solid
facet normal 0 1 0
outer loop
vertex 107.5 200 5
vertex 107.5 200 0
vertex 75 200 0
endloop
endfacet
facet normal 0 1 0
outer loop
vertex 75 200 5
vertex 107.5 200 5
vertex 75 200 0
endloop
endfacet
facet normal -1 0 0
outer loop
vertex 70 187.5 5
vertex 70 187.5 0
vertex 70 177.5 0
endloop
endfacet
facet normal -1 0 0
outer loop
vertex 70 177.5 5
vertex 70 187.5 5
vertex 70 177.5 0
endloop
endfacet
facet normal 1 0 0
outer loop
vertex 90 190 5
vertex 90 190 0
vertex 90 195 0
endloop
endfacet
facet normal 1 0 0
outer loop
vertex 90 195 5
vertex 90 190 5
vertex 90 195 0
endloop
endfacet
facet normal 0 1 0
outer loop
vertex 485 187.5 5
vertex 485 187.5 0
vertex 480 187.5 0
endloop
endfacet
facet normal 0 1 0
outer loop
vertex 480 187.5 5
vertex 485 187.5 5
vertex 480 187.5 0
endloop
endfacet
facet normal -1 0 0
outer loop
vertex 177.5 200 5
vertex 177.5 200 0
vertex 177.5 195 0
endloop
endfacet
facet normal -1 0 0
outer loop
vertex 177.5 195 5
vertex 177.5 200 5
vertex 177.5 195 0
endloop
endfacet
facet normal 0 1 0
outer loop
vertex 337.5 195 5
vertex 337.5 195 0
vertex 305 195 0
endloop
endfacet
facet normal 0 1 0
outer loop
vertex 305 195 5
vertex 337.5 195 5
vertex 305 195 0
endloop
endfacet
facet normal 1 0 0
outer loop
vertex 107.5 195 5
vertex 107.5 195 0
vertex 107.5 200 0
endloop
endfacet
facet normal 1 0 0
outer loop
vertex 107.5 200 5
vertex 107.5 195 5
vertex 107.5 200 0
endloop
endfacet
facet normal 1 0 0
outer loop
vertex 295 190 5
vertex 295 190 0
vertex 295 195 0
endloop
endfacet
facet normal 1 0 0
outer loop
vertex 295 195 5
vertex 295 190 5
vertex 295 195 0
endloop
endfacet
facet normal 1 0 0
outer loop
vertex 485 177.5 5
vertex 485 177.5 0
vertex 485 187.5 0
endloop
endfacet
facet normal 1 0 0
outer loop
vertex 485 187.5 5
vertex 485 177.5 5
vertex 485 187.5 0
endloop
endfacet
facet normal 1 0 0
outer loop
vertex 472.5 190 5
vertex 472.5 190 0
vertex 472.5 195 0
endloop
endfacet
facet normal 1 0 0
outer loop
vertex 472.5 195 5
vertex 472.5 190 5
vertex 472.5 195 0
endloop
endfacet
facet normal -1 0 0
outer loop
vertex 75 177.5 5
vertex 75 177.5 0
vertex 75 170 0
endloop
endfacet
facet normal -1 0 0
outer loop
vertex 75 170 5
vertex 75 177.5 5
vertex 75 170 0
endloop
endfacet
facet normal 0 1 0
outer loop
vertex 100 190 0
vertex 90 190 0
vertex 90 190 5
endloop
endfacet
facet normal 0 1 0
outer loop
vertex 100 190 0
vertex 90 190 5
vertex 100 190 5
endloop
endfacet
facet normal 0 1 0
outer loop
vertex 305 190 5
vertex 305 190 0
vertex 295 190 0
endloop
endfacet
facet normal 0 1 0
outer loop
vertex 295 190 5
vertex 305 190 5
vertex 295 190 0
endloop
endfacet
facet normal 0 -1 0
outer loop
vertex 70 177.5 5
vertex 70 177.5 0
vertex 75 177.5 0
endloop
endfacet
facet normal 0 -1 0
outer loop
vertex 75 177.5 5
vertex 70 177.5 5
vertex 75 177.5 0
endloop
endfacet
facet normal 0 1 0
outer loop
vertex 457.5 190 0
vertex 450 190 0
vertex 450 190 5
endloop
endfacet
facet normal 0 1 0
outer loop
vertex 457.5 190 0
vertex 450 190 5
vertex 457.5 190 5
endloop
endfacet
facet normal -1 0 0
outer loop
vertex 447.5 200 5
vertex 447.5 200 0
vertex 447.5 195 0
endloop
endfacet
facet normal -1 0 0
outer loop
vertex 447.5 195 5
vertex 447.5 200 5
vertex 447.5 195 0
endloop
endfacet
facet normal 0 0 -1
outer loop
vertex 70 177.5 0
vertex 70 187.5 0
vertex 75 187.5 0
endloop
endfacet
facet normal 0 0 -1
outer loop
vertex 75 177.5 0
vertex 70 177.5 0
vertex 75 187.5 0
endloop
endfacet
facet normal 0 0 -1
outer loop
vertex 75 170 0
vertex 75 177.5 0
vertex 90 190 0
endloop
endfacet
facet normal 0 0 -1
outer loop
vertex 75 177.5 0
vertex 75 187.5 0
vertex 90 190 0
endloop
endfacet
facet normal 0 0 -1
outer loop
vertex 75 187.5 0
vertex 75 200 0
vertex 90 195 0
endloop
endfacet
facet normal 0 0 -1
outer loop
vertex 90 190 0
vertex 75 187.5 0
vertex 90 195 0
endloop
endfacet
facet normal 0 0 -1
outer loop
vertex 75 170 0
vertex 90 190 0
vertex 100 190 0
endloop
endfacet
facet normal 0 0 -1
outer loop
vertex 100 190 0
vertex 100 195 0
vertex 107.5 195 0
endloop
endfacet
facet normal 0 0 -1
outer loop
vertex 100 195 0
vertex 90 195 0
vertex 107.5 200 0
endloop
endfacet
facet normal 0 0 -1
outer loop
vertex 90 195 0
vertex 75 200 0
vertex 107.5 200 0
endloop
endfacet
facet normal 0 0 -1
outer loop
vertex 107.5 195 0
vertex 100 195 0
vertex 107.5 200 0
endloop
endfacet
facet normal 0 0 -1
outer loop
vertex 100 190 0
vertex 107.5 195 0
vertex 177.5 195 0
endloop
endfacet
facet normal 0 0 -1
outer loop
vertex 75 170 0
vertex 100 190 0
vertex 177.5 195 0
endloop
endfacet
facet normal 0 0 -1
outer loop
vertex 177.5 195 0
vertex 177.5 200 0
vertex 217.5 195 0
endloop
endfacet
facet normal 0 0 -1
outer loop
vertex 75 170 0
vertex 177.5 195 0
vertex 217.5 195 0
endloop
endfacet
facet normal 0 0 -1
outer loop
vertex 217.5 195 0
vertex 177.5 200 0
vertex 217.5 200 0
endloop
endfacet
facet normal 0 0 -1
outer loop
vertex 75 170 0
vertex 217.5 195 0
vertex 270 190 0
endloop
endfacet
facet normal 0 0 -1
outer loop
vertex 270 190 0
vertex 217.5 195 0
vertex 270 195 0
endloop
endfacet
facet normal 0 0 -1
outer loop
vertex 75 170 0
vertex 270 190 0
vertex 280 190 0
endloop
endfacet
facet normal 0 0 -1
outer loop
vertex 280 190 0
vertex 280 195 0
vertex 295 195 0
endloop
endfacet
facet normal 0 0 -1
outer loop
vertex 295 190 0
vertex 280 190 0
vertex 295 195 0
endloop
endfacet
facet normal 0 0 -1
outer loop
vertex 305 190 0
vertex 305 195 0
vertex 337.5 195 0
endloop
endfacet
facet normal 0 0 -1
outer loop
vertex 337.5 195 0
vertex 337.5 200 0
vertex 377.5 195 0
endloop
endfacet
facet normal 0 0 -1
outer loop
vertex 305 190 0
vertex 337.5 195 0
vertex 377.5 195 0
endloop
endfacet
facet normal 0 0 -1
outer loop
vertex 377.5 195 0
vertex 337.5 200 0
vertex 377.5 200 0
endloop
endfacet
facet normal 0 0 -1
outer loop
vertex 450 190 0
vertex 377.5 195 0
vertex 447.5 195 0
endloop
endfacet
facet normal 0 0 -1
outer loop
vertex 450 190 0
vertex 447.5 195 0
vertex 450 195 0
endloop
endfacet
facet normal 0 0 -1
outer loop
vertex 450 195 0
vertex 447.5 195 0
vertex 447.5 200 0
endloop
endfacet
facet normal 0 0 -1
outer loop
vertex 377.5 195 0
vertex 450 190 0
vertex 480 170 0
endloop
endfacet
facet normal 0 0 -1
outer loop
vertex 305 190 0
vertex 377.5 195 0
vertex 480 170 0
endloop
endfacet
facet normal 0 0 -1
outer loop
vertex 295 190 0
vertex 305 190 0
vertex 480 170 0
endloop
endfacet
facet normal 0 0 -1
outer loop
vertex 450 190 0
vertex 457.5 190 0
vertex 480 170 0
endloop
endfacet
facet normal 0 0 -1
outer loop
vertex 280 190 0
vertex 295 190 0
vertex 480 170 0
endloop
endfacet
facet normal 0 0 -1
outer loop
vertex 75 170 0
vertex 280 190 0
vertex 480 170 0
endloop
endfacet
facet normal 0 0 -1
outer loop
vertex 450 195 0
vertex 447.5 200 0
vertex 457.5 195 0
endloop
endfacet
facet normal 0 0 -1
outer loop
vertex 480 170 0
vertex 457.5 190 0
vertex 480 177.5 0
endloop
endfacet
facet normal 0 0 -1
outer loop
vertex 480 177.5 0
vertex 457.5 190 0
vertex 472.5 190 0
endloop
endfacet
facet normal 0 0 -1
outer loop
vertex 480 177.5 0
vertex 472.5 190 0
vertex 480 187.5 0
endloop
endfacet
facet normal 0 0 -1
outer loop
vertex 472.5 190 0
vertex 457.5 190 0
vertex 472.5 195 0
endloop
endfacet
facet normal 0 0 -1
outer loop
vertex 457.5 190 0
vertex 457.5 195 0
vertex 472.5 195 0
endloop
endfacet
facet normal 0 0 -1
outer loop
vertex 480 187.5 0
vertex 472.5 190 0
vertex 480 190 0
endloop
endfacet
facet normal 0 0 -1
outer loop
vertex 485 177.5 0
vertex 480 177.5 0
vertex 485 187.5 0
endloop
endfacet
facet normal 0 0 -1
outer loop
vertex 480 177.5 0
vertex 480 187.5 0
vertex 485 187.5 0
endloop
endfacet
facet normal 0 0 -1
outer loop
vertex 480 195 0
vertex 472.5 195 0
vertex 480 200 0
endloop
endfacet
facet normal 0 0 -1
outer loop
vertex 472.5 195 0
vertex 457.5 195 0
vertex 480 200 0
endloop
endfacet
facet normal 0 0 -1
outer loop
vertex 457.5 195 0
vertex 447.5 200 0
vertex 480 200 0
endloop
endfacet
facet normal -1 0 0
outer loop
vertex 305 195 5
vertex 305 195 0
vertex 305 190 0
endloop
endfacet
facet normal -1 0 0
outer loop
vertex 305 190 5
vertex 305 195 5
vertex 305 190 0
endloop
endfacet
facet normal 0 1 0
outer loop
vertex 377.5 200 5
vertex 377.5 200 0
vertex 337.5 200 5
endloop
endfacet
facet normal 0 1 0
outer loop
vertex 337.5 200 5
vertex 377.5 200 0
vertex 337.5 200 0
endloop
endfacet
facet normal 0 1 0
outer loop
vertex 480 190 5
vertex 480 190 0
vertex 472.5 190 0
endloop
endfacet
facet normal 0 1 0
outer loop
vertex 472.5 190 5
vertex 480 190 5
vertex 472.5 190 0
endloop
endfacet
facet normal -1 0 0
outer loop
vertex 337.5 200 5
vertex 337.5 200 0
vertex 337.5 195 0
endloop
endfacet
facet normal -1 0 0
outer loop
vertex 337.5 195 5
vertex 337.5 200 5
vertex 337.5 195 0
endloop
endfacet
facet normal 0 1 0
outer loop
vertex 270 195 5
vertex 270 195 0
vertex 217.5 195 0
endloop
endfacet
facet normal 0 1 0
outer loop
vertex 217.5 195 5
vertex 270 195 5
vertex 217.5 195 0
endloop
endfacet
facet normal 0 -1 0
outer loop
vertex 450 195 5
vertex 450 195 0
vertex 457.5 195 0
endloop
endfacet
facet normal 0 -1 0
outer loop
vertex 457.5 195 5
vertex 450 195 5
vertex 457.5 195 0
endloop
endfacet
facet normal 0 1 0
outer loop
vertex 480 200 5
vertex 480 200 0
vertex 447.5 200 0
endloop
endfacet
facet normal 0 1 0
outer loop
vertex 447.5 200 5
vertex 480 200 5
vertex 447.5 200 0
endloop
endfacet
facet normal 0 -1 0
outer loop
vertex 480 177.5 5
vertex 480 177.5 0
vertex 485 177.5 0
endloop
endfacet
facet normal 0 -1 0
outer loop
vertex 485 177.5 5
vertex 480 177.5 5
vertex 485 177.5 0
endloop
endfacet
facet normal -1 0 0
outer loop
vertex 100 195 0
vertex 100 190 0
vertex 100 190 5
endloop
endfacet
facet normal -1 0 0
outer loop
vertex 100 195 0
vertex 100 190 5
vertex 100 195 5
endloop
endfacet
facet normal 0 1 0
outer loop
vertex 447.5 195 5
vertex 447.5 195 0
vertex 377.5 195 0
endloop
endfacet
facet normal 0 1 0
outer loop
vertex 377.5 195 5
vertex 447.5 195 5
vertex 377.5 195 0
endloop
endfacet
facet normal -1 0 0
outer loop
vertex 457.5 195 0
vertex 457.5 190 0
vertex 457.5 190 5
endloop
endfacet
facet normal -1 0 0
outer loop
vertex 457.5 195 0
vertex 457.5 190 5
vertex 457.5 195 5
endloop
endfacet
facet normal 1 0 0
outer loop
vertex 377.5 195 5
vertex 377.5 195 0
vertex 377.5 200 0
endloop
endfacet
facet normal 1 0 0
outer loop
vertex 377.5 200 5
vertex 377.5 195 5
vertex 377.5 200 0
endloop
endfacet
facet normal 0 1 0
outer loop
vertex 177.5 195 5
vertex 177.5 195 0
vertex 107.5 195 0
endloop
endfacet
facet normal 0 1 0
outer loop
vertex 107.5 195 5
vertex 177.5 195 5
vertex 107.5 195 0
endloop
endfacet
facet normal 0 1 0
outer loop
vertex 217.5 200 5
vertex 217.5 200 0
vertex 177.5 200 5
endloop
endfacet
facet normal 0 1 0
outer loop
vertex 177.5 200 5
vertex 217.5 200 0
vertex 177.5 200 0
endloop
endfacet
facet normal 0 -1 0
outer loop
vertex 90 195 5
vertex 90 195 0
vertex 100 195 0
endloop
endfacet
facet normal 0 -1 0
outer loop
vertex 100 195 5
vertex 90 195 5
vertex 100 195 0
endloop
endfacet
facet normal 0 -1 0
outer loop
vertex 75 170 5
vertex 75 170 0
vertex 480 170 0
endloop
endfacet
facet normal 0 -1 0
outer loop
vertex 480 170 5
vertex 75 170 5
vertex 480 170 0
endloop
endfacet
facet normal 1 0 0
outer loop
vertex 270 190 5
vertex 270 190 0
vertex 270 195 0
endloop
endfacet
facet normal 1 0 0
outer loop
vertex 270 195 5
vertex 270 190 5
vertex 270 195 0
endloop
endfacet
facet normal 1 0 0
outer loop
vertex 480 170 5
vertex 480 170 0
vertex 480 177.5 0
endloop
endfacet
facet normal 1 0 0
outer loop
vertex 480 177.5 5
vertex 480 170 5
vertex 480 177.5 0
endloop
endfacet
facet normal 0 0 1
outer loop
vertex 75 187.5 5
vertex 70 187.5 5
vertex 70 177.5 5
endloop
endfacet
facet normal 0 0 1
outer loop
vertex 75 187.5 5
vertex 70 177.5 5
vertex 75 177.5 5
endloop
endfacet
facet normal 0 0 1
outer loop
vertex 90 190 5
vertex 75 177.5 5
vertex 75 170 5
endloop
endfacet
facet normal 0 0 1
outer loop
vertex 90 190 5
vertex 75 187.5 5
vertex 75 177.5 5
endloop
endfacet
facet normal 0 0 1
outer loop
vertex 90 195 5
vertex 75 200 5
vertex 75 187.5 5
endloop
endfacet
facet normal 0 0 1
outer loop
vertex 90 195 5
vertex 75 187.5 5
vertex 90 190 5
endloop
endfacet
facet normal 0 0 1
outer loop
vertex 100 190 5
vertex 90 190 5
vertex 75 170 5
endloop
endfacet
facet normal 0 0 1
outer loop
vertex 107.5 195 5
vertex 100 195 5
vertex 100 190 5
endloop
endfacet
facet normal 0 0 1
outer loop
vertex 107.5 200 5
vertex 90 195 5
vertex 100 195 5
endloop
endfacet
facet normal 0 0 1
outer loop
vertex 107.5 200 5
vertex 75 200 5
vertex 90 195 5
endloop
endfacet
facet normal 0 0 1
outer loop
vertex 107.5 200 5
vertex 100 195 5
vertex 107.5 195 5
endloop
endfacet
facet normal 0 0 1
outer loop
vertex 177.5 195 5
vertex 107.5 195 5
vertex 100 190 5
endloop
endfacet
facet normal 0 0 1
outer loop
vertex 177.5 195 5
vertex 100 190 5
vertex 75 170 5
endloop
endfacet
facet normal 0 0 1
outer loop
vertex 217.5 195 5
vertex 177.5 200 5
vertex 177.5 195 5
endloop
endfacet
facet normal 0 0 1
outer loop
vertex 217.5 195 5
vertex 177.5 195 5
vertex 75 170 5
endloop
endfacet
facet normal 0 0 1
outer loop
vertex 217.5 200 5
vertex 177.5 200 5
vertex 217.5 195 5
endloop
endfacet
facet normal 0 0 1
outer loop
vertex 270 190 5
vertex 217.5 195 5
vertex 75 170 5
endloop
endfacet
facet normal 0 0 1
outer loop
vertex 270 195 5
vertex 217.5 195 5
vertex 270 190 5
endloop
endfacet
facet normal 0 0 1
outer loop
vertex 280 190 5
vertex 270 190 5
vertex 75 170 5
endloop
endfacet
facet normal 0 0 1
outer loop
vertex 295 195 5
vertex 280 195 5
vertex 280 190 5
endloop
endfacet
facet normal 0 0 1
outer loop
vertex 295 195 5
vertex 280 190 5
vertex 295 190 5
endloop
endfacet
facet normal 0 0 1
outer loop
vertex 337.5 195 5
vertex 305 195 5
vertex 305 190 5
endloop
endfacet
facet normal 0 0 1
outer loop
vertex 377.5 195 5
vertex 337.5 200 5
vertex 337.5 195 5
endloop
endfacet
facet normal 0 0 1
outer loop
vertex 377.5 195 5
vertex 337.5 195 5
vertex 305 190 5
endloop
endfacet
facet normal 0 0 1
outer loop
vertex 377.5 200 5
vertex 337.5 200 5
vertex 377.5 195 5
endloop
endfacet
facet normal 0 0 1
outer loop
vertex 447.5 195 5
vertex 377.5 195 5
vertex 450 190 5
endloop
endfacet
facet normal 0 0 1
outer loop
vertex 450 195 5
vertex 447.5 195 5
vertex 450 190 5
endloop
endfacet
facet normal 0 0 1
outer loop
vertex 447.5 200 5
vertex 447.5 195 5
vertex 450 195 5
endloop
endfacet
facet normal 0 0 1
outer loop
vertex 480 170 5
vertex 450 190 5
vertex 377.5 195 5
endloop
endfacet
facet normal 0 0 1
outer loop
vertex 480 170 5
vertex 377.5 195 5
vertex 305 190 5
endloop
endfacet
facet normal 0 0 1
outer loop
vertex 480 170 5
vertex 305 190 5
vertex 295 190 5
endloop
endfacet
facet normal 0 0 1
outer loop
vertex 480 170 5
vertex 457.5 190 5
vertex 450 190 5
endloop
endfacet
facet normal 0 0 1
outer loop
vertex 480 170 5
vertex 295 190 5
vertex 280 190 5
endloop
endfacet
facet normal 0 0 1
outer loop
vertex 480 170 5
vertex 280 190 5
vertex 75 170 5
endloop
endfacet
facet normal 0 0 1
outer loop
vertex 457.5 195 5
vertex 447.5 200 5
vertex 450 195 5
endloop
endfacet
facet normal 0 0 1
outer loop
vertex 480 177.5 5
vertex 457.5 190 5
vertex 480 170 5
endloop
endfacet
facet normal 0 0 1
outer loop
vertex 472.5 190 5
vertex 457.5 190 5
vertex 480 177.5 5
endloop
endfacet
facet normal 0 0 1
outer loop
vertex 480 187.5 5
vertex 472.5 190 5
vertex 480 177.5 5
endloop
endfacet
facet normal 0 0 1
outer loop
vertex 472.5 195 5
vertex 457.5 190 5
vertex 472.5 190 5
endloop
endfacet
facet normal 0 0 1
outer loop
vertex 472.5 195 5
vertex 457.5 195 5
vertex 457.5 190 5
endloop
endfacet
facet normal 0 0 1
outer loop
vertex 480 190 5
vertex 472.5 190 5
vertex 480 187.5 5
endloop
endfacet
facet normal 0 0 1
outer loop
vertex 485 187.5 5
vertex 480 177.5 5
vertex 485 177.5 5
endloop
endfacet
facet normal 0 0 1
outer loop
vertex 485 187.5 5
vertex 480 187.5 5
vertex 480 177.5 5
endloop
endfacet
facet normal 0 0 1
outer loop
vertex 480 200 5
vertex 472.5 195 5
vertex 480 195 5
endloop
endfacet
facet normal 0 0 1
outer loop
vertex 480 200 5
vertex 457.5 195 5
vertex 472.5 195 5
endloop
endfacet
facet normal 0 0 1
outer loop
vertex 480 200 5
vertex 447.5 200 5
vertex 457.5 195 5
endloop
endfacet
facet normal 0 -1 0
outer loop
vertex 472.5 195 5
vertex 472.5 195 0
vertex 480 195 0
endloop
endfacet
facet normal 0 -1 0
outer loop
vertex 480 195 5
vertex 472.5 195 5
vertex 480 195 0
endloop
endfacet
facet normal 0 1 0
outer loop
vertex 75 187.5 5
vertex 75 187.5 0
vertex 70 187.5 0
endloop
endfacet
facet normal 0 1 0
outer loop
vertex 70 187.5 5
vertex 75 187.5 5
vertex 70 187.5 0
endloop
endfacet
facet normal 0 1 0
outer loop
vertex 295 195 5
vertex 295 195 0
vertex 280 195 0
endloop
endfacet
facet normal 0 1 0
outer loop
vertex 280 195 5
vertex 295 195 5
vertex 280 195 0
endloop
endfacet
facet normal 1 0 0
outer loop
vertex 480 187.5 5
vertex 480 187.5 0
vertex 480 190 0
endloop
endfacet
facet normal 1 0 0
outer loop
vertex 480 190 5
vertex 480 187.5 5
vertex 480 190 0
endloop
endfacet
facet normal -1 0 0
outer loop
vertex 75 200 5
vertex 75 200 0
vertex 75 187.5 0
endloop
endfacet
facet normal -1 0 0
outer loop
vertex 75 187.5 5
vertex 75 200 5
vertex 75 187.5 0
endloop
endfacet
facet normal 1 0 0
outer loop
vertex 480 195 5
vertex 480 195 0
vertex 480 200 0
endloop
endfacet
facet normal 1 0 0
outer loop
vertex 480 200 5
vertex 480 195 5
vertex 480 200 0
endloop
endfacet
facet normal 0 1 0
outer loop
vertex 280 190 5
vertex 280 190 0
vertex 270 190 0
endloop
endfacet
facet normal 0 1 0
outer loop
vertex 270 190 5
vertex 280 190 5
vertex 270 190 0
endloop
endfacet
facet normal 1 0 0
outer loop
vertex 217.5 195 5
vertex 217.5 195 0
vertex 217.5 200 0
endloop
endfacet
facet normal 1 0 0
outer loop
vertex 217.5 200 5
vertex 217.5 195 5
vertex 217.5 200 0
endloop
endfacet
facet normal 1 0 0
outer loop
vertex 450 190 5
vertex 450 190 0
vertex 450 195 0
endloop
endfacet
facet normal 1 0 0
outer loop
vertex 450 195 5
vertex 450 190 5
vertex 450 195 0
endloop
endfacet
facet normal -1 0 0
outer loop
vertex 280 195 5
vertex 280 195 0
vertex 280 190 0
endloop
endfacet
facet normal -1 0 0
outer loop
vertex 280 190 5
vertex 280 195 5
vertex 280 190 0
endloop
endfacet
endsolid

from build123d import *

# Parameters (mm, degrees)
SKETCH1_W           = 7.5
SKETCH1_H           = 5
SKETCH1_W_2         = 10
BOSS_EXTRUDE1_DEPTH = 5


with BuildPart() as part:
    # Sketch1 → Boss-Extrude1 (new body)
    with BuildSketch(Plane.XY):
        Polygon((480, 177.5), (485, 177.5), (485, 187.5), (480, 187.5), (480, 190), (472.5, 190), (472.5, 195), (480, 195), (480, 200), (447.5, 200), (447.5, 195), (377.5, 195), (377.5, 200), (337.5, 200), (337.5, 195), (305, 195), (305, 190), (295, 190), (295, 195), (280, 195), (280, 190), (270, 190), (270, 195), (217.5, 195), (217.5, 200), (177.5, 200), (177.5, 195), (107.5, 195), (107.5, 200), (75, 200), (75, 195), (75, 187.5), (70, 187.5), (70, 177.5), (75, 177.5), (75, 170), (480, 170), align=None)
        with Locations((453.75, 192.5)):
            Rectangle(SKETCH1_W, SKETCH1_H, mode=Mode.SUBTRACT)
        with Locations((95, 192.5)):
            Rectangle(SKETCH1_W_2, SKETCH1_H, mode=Mode.SUBTRACT)
    extrude(amount=BOSS_EXTRUDE1_DEPTH)


solid = part.part
